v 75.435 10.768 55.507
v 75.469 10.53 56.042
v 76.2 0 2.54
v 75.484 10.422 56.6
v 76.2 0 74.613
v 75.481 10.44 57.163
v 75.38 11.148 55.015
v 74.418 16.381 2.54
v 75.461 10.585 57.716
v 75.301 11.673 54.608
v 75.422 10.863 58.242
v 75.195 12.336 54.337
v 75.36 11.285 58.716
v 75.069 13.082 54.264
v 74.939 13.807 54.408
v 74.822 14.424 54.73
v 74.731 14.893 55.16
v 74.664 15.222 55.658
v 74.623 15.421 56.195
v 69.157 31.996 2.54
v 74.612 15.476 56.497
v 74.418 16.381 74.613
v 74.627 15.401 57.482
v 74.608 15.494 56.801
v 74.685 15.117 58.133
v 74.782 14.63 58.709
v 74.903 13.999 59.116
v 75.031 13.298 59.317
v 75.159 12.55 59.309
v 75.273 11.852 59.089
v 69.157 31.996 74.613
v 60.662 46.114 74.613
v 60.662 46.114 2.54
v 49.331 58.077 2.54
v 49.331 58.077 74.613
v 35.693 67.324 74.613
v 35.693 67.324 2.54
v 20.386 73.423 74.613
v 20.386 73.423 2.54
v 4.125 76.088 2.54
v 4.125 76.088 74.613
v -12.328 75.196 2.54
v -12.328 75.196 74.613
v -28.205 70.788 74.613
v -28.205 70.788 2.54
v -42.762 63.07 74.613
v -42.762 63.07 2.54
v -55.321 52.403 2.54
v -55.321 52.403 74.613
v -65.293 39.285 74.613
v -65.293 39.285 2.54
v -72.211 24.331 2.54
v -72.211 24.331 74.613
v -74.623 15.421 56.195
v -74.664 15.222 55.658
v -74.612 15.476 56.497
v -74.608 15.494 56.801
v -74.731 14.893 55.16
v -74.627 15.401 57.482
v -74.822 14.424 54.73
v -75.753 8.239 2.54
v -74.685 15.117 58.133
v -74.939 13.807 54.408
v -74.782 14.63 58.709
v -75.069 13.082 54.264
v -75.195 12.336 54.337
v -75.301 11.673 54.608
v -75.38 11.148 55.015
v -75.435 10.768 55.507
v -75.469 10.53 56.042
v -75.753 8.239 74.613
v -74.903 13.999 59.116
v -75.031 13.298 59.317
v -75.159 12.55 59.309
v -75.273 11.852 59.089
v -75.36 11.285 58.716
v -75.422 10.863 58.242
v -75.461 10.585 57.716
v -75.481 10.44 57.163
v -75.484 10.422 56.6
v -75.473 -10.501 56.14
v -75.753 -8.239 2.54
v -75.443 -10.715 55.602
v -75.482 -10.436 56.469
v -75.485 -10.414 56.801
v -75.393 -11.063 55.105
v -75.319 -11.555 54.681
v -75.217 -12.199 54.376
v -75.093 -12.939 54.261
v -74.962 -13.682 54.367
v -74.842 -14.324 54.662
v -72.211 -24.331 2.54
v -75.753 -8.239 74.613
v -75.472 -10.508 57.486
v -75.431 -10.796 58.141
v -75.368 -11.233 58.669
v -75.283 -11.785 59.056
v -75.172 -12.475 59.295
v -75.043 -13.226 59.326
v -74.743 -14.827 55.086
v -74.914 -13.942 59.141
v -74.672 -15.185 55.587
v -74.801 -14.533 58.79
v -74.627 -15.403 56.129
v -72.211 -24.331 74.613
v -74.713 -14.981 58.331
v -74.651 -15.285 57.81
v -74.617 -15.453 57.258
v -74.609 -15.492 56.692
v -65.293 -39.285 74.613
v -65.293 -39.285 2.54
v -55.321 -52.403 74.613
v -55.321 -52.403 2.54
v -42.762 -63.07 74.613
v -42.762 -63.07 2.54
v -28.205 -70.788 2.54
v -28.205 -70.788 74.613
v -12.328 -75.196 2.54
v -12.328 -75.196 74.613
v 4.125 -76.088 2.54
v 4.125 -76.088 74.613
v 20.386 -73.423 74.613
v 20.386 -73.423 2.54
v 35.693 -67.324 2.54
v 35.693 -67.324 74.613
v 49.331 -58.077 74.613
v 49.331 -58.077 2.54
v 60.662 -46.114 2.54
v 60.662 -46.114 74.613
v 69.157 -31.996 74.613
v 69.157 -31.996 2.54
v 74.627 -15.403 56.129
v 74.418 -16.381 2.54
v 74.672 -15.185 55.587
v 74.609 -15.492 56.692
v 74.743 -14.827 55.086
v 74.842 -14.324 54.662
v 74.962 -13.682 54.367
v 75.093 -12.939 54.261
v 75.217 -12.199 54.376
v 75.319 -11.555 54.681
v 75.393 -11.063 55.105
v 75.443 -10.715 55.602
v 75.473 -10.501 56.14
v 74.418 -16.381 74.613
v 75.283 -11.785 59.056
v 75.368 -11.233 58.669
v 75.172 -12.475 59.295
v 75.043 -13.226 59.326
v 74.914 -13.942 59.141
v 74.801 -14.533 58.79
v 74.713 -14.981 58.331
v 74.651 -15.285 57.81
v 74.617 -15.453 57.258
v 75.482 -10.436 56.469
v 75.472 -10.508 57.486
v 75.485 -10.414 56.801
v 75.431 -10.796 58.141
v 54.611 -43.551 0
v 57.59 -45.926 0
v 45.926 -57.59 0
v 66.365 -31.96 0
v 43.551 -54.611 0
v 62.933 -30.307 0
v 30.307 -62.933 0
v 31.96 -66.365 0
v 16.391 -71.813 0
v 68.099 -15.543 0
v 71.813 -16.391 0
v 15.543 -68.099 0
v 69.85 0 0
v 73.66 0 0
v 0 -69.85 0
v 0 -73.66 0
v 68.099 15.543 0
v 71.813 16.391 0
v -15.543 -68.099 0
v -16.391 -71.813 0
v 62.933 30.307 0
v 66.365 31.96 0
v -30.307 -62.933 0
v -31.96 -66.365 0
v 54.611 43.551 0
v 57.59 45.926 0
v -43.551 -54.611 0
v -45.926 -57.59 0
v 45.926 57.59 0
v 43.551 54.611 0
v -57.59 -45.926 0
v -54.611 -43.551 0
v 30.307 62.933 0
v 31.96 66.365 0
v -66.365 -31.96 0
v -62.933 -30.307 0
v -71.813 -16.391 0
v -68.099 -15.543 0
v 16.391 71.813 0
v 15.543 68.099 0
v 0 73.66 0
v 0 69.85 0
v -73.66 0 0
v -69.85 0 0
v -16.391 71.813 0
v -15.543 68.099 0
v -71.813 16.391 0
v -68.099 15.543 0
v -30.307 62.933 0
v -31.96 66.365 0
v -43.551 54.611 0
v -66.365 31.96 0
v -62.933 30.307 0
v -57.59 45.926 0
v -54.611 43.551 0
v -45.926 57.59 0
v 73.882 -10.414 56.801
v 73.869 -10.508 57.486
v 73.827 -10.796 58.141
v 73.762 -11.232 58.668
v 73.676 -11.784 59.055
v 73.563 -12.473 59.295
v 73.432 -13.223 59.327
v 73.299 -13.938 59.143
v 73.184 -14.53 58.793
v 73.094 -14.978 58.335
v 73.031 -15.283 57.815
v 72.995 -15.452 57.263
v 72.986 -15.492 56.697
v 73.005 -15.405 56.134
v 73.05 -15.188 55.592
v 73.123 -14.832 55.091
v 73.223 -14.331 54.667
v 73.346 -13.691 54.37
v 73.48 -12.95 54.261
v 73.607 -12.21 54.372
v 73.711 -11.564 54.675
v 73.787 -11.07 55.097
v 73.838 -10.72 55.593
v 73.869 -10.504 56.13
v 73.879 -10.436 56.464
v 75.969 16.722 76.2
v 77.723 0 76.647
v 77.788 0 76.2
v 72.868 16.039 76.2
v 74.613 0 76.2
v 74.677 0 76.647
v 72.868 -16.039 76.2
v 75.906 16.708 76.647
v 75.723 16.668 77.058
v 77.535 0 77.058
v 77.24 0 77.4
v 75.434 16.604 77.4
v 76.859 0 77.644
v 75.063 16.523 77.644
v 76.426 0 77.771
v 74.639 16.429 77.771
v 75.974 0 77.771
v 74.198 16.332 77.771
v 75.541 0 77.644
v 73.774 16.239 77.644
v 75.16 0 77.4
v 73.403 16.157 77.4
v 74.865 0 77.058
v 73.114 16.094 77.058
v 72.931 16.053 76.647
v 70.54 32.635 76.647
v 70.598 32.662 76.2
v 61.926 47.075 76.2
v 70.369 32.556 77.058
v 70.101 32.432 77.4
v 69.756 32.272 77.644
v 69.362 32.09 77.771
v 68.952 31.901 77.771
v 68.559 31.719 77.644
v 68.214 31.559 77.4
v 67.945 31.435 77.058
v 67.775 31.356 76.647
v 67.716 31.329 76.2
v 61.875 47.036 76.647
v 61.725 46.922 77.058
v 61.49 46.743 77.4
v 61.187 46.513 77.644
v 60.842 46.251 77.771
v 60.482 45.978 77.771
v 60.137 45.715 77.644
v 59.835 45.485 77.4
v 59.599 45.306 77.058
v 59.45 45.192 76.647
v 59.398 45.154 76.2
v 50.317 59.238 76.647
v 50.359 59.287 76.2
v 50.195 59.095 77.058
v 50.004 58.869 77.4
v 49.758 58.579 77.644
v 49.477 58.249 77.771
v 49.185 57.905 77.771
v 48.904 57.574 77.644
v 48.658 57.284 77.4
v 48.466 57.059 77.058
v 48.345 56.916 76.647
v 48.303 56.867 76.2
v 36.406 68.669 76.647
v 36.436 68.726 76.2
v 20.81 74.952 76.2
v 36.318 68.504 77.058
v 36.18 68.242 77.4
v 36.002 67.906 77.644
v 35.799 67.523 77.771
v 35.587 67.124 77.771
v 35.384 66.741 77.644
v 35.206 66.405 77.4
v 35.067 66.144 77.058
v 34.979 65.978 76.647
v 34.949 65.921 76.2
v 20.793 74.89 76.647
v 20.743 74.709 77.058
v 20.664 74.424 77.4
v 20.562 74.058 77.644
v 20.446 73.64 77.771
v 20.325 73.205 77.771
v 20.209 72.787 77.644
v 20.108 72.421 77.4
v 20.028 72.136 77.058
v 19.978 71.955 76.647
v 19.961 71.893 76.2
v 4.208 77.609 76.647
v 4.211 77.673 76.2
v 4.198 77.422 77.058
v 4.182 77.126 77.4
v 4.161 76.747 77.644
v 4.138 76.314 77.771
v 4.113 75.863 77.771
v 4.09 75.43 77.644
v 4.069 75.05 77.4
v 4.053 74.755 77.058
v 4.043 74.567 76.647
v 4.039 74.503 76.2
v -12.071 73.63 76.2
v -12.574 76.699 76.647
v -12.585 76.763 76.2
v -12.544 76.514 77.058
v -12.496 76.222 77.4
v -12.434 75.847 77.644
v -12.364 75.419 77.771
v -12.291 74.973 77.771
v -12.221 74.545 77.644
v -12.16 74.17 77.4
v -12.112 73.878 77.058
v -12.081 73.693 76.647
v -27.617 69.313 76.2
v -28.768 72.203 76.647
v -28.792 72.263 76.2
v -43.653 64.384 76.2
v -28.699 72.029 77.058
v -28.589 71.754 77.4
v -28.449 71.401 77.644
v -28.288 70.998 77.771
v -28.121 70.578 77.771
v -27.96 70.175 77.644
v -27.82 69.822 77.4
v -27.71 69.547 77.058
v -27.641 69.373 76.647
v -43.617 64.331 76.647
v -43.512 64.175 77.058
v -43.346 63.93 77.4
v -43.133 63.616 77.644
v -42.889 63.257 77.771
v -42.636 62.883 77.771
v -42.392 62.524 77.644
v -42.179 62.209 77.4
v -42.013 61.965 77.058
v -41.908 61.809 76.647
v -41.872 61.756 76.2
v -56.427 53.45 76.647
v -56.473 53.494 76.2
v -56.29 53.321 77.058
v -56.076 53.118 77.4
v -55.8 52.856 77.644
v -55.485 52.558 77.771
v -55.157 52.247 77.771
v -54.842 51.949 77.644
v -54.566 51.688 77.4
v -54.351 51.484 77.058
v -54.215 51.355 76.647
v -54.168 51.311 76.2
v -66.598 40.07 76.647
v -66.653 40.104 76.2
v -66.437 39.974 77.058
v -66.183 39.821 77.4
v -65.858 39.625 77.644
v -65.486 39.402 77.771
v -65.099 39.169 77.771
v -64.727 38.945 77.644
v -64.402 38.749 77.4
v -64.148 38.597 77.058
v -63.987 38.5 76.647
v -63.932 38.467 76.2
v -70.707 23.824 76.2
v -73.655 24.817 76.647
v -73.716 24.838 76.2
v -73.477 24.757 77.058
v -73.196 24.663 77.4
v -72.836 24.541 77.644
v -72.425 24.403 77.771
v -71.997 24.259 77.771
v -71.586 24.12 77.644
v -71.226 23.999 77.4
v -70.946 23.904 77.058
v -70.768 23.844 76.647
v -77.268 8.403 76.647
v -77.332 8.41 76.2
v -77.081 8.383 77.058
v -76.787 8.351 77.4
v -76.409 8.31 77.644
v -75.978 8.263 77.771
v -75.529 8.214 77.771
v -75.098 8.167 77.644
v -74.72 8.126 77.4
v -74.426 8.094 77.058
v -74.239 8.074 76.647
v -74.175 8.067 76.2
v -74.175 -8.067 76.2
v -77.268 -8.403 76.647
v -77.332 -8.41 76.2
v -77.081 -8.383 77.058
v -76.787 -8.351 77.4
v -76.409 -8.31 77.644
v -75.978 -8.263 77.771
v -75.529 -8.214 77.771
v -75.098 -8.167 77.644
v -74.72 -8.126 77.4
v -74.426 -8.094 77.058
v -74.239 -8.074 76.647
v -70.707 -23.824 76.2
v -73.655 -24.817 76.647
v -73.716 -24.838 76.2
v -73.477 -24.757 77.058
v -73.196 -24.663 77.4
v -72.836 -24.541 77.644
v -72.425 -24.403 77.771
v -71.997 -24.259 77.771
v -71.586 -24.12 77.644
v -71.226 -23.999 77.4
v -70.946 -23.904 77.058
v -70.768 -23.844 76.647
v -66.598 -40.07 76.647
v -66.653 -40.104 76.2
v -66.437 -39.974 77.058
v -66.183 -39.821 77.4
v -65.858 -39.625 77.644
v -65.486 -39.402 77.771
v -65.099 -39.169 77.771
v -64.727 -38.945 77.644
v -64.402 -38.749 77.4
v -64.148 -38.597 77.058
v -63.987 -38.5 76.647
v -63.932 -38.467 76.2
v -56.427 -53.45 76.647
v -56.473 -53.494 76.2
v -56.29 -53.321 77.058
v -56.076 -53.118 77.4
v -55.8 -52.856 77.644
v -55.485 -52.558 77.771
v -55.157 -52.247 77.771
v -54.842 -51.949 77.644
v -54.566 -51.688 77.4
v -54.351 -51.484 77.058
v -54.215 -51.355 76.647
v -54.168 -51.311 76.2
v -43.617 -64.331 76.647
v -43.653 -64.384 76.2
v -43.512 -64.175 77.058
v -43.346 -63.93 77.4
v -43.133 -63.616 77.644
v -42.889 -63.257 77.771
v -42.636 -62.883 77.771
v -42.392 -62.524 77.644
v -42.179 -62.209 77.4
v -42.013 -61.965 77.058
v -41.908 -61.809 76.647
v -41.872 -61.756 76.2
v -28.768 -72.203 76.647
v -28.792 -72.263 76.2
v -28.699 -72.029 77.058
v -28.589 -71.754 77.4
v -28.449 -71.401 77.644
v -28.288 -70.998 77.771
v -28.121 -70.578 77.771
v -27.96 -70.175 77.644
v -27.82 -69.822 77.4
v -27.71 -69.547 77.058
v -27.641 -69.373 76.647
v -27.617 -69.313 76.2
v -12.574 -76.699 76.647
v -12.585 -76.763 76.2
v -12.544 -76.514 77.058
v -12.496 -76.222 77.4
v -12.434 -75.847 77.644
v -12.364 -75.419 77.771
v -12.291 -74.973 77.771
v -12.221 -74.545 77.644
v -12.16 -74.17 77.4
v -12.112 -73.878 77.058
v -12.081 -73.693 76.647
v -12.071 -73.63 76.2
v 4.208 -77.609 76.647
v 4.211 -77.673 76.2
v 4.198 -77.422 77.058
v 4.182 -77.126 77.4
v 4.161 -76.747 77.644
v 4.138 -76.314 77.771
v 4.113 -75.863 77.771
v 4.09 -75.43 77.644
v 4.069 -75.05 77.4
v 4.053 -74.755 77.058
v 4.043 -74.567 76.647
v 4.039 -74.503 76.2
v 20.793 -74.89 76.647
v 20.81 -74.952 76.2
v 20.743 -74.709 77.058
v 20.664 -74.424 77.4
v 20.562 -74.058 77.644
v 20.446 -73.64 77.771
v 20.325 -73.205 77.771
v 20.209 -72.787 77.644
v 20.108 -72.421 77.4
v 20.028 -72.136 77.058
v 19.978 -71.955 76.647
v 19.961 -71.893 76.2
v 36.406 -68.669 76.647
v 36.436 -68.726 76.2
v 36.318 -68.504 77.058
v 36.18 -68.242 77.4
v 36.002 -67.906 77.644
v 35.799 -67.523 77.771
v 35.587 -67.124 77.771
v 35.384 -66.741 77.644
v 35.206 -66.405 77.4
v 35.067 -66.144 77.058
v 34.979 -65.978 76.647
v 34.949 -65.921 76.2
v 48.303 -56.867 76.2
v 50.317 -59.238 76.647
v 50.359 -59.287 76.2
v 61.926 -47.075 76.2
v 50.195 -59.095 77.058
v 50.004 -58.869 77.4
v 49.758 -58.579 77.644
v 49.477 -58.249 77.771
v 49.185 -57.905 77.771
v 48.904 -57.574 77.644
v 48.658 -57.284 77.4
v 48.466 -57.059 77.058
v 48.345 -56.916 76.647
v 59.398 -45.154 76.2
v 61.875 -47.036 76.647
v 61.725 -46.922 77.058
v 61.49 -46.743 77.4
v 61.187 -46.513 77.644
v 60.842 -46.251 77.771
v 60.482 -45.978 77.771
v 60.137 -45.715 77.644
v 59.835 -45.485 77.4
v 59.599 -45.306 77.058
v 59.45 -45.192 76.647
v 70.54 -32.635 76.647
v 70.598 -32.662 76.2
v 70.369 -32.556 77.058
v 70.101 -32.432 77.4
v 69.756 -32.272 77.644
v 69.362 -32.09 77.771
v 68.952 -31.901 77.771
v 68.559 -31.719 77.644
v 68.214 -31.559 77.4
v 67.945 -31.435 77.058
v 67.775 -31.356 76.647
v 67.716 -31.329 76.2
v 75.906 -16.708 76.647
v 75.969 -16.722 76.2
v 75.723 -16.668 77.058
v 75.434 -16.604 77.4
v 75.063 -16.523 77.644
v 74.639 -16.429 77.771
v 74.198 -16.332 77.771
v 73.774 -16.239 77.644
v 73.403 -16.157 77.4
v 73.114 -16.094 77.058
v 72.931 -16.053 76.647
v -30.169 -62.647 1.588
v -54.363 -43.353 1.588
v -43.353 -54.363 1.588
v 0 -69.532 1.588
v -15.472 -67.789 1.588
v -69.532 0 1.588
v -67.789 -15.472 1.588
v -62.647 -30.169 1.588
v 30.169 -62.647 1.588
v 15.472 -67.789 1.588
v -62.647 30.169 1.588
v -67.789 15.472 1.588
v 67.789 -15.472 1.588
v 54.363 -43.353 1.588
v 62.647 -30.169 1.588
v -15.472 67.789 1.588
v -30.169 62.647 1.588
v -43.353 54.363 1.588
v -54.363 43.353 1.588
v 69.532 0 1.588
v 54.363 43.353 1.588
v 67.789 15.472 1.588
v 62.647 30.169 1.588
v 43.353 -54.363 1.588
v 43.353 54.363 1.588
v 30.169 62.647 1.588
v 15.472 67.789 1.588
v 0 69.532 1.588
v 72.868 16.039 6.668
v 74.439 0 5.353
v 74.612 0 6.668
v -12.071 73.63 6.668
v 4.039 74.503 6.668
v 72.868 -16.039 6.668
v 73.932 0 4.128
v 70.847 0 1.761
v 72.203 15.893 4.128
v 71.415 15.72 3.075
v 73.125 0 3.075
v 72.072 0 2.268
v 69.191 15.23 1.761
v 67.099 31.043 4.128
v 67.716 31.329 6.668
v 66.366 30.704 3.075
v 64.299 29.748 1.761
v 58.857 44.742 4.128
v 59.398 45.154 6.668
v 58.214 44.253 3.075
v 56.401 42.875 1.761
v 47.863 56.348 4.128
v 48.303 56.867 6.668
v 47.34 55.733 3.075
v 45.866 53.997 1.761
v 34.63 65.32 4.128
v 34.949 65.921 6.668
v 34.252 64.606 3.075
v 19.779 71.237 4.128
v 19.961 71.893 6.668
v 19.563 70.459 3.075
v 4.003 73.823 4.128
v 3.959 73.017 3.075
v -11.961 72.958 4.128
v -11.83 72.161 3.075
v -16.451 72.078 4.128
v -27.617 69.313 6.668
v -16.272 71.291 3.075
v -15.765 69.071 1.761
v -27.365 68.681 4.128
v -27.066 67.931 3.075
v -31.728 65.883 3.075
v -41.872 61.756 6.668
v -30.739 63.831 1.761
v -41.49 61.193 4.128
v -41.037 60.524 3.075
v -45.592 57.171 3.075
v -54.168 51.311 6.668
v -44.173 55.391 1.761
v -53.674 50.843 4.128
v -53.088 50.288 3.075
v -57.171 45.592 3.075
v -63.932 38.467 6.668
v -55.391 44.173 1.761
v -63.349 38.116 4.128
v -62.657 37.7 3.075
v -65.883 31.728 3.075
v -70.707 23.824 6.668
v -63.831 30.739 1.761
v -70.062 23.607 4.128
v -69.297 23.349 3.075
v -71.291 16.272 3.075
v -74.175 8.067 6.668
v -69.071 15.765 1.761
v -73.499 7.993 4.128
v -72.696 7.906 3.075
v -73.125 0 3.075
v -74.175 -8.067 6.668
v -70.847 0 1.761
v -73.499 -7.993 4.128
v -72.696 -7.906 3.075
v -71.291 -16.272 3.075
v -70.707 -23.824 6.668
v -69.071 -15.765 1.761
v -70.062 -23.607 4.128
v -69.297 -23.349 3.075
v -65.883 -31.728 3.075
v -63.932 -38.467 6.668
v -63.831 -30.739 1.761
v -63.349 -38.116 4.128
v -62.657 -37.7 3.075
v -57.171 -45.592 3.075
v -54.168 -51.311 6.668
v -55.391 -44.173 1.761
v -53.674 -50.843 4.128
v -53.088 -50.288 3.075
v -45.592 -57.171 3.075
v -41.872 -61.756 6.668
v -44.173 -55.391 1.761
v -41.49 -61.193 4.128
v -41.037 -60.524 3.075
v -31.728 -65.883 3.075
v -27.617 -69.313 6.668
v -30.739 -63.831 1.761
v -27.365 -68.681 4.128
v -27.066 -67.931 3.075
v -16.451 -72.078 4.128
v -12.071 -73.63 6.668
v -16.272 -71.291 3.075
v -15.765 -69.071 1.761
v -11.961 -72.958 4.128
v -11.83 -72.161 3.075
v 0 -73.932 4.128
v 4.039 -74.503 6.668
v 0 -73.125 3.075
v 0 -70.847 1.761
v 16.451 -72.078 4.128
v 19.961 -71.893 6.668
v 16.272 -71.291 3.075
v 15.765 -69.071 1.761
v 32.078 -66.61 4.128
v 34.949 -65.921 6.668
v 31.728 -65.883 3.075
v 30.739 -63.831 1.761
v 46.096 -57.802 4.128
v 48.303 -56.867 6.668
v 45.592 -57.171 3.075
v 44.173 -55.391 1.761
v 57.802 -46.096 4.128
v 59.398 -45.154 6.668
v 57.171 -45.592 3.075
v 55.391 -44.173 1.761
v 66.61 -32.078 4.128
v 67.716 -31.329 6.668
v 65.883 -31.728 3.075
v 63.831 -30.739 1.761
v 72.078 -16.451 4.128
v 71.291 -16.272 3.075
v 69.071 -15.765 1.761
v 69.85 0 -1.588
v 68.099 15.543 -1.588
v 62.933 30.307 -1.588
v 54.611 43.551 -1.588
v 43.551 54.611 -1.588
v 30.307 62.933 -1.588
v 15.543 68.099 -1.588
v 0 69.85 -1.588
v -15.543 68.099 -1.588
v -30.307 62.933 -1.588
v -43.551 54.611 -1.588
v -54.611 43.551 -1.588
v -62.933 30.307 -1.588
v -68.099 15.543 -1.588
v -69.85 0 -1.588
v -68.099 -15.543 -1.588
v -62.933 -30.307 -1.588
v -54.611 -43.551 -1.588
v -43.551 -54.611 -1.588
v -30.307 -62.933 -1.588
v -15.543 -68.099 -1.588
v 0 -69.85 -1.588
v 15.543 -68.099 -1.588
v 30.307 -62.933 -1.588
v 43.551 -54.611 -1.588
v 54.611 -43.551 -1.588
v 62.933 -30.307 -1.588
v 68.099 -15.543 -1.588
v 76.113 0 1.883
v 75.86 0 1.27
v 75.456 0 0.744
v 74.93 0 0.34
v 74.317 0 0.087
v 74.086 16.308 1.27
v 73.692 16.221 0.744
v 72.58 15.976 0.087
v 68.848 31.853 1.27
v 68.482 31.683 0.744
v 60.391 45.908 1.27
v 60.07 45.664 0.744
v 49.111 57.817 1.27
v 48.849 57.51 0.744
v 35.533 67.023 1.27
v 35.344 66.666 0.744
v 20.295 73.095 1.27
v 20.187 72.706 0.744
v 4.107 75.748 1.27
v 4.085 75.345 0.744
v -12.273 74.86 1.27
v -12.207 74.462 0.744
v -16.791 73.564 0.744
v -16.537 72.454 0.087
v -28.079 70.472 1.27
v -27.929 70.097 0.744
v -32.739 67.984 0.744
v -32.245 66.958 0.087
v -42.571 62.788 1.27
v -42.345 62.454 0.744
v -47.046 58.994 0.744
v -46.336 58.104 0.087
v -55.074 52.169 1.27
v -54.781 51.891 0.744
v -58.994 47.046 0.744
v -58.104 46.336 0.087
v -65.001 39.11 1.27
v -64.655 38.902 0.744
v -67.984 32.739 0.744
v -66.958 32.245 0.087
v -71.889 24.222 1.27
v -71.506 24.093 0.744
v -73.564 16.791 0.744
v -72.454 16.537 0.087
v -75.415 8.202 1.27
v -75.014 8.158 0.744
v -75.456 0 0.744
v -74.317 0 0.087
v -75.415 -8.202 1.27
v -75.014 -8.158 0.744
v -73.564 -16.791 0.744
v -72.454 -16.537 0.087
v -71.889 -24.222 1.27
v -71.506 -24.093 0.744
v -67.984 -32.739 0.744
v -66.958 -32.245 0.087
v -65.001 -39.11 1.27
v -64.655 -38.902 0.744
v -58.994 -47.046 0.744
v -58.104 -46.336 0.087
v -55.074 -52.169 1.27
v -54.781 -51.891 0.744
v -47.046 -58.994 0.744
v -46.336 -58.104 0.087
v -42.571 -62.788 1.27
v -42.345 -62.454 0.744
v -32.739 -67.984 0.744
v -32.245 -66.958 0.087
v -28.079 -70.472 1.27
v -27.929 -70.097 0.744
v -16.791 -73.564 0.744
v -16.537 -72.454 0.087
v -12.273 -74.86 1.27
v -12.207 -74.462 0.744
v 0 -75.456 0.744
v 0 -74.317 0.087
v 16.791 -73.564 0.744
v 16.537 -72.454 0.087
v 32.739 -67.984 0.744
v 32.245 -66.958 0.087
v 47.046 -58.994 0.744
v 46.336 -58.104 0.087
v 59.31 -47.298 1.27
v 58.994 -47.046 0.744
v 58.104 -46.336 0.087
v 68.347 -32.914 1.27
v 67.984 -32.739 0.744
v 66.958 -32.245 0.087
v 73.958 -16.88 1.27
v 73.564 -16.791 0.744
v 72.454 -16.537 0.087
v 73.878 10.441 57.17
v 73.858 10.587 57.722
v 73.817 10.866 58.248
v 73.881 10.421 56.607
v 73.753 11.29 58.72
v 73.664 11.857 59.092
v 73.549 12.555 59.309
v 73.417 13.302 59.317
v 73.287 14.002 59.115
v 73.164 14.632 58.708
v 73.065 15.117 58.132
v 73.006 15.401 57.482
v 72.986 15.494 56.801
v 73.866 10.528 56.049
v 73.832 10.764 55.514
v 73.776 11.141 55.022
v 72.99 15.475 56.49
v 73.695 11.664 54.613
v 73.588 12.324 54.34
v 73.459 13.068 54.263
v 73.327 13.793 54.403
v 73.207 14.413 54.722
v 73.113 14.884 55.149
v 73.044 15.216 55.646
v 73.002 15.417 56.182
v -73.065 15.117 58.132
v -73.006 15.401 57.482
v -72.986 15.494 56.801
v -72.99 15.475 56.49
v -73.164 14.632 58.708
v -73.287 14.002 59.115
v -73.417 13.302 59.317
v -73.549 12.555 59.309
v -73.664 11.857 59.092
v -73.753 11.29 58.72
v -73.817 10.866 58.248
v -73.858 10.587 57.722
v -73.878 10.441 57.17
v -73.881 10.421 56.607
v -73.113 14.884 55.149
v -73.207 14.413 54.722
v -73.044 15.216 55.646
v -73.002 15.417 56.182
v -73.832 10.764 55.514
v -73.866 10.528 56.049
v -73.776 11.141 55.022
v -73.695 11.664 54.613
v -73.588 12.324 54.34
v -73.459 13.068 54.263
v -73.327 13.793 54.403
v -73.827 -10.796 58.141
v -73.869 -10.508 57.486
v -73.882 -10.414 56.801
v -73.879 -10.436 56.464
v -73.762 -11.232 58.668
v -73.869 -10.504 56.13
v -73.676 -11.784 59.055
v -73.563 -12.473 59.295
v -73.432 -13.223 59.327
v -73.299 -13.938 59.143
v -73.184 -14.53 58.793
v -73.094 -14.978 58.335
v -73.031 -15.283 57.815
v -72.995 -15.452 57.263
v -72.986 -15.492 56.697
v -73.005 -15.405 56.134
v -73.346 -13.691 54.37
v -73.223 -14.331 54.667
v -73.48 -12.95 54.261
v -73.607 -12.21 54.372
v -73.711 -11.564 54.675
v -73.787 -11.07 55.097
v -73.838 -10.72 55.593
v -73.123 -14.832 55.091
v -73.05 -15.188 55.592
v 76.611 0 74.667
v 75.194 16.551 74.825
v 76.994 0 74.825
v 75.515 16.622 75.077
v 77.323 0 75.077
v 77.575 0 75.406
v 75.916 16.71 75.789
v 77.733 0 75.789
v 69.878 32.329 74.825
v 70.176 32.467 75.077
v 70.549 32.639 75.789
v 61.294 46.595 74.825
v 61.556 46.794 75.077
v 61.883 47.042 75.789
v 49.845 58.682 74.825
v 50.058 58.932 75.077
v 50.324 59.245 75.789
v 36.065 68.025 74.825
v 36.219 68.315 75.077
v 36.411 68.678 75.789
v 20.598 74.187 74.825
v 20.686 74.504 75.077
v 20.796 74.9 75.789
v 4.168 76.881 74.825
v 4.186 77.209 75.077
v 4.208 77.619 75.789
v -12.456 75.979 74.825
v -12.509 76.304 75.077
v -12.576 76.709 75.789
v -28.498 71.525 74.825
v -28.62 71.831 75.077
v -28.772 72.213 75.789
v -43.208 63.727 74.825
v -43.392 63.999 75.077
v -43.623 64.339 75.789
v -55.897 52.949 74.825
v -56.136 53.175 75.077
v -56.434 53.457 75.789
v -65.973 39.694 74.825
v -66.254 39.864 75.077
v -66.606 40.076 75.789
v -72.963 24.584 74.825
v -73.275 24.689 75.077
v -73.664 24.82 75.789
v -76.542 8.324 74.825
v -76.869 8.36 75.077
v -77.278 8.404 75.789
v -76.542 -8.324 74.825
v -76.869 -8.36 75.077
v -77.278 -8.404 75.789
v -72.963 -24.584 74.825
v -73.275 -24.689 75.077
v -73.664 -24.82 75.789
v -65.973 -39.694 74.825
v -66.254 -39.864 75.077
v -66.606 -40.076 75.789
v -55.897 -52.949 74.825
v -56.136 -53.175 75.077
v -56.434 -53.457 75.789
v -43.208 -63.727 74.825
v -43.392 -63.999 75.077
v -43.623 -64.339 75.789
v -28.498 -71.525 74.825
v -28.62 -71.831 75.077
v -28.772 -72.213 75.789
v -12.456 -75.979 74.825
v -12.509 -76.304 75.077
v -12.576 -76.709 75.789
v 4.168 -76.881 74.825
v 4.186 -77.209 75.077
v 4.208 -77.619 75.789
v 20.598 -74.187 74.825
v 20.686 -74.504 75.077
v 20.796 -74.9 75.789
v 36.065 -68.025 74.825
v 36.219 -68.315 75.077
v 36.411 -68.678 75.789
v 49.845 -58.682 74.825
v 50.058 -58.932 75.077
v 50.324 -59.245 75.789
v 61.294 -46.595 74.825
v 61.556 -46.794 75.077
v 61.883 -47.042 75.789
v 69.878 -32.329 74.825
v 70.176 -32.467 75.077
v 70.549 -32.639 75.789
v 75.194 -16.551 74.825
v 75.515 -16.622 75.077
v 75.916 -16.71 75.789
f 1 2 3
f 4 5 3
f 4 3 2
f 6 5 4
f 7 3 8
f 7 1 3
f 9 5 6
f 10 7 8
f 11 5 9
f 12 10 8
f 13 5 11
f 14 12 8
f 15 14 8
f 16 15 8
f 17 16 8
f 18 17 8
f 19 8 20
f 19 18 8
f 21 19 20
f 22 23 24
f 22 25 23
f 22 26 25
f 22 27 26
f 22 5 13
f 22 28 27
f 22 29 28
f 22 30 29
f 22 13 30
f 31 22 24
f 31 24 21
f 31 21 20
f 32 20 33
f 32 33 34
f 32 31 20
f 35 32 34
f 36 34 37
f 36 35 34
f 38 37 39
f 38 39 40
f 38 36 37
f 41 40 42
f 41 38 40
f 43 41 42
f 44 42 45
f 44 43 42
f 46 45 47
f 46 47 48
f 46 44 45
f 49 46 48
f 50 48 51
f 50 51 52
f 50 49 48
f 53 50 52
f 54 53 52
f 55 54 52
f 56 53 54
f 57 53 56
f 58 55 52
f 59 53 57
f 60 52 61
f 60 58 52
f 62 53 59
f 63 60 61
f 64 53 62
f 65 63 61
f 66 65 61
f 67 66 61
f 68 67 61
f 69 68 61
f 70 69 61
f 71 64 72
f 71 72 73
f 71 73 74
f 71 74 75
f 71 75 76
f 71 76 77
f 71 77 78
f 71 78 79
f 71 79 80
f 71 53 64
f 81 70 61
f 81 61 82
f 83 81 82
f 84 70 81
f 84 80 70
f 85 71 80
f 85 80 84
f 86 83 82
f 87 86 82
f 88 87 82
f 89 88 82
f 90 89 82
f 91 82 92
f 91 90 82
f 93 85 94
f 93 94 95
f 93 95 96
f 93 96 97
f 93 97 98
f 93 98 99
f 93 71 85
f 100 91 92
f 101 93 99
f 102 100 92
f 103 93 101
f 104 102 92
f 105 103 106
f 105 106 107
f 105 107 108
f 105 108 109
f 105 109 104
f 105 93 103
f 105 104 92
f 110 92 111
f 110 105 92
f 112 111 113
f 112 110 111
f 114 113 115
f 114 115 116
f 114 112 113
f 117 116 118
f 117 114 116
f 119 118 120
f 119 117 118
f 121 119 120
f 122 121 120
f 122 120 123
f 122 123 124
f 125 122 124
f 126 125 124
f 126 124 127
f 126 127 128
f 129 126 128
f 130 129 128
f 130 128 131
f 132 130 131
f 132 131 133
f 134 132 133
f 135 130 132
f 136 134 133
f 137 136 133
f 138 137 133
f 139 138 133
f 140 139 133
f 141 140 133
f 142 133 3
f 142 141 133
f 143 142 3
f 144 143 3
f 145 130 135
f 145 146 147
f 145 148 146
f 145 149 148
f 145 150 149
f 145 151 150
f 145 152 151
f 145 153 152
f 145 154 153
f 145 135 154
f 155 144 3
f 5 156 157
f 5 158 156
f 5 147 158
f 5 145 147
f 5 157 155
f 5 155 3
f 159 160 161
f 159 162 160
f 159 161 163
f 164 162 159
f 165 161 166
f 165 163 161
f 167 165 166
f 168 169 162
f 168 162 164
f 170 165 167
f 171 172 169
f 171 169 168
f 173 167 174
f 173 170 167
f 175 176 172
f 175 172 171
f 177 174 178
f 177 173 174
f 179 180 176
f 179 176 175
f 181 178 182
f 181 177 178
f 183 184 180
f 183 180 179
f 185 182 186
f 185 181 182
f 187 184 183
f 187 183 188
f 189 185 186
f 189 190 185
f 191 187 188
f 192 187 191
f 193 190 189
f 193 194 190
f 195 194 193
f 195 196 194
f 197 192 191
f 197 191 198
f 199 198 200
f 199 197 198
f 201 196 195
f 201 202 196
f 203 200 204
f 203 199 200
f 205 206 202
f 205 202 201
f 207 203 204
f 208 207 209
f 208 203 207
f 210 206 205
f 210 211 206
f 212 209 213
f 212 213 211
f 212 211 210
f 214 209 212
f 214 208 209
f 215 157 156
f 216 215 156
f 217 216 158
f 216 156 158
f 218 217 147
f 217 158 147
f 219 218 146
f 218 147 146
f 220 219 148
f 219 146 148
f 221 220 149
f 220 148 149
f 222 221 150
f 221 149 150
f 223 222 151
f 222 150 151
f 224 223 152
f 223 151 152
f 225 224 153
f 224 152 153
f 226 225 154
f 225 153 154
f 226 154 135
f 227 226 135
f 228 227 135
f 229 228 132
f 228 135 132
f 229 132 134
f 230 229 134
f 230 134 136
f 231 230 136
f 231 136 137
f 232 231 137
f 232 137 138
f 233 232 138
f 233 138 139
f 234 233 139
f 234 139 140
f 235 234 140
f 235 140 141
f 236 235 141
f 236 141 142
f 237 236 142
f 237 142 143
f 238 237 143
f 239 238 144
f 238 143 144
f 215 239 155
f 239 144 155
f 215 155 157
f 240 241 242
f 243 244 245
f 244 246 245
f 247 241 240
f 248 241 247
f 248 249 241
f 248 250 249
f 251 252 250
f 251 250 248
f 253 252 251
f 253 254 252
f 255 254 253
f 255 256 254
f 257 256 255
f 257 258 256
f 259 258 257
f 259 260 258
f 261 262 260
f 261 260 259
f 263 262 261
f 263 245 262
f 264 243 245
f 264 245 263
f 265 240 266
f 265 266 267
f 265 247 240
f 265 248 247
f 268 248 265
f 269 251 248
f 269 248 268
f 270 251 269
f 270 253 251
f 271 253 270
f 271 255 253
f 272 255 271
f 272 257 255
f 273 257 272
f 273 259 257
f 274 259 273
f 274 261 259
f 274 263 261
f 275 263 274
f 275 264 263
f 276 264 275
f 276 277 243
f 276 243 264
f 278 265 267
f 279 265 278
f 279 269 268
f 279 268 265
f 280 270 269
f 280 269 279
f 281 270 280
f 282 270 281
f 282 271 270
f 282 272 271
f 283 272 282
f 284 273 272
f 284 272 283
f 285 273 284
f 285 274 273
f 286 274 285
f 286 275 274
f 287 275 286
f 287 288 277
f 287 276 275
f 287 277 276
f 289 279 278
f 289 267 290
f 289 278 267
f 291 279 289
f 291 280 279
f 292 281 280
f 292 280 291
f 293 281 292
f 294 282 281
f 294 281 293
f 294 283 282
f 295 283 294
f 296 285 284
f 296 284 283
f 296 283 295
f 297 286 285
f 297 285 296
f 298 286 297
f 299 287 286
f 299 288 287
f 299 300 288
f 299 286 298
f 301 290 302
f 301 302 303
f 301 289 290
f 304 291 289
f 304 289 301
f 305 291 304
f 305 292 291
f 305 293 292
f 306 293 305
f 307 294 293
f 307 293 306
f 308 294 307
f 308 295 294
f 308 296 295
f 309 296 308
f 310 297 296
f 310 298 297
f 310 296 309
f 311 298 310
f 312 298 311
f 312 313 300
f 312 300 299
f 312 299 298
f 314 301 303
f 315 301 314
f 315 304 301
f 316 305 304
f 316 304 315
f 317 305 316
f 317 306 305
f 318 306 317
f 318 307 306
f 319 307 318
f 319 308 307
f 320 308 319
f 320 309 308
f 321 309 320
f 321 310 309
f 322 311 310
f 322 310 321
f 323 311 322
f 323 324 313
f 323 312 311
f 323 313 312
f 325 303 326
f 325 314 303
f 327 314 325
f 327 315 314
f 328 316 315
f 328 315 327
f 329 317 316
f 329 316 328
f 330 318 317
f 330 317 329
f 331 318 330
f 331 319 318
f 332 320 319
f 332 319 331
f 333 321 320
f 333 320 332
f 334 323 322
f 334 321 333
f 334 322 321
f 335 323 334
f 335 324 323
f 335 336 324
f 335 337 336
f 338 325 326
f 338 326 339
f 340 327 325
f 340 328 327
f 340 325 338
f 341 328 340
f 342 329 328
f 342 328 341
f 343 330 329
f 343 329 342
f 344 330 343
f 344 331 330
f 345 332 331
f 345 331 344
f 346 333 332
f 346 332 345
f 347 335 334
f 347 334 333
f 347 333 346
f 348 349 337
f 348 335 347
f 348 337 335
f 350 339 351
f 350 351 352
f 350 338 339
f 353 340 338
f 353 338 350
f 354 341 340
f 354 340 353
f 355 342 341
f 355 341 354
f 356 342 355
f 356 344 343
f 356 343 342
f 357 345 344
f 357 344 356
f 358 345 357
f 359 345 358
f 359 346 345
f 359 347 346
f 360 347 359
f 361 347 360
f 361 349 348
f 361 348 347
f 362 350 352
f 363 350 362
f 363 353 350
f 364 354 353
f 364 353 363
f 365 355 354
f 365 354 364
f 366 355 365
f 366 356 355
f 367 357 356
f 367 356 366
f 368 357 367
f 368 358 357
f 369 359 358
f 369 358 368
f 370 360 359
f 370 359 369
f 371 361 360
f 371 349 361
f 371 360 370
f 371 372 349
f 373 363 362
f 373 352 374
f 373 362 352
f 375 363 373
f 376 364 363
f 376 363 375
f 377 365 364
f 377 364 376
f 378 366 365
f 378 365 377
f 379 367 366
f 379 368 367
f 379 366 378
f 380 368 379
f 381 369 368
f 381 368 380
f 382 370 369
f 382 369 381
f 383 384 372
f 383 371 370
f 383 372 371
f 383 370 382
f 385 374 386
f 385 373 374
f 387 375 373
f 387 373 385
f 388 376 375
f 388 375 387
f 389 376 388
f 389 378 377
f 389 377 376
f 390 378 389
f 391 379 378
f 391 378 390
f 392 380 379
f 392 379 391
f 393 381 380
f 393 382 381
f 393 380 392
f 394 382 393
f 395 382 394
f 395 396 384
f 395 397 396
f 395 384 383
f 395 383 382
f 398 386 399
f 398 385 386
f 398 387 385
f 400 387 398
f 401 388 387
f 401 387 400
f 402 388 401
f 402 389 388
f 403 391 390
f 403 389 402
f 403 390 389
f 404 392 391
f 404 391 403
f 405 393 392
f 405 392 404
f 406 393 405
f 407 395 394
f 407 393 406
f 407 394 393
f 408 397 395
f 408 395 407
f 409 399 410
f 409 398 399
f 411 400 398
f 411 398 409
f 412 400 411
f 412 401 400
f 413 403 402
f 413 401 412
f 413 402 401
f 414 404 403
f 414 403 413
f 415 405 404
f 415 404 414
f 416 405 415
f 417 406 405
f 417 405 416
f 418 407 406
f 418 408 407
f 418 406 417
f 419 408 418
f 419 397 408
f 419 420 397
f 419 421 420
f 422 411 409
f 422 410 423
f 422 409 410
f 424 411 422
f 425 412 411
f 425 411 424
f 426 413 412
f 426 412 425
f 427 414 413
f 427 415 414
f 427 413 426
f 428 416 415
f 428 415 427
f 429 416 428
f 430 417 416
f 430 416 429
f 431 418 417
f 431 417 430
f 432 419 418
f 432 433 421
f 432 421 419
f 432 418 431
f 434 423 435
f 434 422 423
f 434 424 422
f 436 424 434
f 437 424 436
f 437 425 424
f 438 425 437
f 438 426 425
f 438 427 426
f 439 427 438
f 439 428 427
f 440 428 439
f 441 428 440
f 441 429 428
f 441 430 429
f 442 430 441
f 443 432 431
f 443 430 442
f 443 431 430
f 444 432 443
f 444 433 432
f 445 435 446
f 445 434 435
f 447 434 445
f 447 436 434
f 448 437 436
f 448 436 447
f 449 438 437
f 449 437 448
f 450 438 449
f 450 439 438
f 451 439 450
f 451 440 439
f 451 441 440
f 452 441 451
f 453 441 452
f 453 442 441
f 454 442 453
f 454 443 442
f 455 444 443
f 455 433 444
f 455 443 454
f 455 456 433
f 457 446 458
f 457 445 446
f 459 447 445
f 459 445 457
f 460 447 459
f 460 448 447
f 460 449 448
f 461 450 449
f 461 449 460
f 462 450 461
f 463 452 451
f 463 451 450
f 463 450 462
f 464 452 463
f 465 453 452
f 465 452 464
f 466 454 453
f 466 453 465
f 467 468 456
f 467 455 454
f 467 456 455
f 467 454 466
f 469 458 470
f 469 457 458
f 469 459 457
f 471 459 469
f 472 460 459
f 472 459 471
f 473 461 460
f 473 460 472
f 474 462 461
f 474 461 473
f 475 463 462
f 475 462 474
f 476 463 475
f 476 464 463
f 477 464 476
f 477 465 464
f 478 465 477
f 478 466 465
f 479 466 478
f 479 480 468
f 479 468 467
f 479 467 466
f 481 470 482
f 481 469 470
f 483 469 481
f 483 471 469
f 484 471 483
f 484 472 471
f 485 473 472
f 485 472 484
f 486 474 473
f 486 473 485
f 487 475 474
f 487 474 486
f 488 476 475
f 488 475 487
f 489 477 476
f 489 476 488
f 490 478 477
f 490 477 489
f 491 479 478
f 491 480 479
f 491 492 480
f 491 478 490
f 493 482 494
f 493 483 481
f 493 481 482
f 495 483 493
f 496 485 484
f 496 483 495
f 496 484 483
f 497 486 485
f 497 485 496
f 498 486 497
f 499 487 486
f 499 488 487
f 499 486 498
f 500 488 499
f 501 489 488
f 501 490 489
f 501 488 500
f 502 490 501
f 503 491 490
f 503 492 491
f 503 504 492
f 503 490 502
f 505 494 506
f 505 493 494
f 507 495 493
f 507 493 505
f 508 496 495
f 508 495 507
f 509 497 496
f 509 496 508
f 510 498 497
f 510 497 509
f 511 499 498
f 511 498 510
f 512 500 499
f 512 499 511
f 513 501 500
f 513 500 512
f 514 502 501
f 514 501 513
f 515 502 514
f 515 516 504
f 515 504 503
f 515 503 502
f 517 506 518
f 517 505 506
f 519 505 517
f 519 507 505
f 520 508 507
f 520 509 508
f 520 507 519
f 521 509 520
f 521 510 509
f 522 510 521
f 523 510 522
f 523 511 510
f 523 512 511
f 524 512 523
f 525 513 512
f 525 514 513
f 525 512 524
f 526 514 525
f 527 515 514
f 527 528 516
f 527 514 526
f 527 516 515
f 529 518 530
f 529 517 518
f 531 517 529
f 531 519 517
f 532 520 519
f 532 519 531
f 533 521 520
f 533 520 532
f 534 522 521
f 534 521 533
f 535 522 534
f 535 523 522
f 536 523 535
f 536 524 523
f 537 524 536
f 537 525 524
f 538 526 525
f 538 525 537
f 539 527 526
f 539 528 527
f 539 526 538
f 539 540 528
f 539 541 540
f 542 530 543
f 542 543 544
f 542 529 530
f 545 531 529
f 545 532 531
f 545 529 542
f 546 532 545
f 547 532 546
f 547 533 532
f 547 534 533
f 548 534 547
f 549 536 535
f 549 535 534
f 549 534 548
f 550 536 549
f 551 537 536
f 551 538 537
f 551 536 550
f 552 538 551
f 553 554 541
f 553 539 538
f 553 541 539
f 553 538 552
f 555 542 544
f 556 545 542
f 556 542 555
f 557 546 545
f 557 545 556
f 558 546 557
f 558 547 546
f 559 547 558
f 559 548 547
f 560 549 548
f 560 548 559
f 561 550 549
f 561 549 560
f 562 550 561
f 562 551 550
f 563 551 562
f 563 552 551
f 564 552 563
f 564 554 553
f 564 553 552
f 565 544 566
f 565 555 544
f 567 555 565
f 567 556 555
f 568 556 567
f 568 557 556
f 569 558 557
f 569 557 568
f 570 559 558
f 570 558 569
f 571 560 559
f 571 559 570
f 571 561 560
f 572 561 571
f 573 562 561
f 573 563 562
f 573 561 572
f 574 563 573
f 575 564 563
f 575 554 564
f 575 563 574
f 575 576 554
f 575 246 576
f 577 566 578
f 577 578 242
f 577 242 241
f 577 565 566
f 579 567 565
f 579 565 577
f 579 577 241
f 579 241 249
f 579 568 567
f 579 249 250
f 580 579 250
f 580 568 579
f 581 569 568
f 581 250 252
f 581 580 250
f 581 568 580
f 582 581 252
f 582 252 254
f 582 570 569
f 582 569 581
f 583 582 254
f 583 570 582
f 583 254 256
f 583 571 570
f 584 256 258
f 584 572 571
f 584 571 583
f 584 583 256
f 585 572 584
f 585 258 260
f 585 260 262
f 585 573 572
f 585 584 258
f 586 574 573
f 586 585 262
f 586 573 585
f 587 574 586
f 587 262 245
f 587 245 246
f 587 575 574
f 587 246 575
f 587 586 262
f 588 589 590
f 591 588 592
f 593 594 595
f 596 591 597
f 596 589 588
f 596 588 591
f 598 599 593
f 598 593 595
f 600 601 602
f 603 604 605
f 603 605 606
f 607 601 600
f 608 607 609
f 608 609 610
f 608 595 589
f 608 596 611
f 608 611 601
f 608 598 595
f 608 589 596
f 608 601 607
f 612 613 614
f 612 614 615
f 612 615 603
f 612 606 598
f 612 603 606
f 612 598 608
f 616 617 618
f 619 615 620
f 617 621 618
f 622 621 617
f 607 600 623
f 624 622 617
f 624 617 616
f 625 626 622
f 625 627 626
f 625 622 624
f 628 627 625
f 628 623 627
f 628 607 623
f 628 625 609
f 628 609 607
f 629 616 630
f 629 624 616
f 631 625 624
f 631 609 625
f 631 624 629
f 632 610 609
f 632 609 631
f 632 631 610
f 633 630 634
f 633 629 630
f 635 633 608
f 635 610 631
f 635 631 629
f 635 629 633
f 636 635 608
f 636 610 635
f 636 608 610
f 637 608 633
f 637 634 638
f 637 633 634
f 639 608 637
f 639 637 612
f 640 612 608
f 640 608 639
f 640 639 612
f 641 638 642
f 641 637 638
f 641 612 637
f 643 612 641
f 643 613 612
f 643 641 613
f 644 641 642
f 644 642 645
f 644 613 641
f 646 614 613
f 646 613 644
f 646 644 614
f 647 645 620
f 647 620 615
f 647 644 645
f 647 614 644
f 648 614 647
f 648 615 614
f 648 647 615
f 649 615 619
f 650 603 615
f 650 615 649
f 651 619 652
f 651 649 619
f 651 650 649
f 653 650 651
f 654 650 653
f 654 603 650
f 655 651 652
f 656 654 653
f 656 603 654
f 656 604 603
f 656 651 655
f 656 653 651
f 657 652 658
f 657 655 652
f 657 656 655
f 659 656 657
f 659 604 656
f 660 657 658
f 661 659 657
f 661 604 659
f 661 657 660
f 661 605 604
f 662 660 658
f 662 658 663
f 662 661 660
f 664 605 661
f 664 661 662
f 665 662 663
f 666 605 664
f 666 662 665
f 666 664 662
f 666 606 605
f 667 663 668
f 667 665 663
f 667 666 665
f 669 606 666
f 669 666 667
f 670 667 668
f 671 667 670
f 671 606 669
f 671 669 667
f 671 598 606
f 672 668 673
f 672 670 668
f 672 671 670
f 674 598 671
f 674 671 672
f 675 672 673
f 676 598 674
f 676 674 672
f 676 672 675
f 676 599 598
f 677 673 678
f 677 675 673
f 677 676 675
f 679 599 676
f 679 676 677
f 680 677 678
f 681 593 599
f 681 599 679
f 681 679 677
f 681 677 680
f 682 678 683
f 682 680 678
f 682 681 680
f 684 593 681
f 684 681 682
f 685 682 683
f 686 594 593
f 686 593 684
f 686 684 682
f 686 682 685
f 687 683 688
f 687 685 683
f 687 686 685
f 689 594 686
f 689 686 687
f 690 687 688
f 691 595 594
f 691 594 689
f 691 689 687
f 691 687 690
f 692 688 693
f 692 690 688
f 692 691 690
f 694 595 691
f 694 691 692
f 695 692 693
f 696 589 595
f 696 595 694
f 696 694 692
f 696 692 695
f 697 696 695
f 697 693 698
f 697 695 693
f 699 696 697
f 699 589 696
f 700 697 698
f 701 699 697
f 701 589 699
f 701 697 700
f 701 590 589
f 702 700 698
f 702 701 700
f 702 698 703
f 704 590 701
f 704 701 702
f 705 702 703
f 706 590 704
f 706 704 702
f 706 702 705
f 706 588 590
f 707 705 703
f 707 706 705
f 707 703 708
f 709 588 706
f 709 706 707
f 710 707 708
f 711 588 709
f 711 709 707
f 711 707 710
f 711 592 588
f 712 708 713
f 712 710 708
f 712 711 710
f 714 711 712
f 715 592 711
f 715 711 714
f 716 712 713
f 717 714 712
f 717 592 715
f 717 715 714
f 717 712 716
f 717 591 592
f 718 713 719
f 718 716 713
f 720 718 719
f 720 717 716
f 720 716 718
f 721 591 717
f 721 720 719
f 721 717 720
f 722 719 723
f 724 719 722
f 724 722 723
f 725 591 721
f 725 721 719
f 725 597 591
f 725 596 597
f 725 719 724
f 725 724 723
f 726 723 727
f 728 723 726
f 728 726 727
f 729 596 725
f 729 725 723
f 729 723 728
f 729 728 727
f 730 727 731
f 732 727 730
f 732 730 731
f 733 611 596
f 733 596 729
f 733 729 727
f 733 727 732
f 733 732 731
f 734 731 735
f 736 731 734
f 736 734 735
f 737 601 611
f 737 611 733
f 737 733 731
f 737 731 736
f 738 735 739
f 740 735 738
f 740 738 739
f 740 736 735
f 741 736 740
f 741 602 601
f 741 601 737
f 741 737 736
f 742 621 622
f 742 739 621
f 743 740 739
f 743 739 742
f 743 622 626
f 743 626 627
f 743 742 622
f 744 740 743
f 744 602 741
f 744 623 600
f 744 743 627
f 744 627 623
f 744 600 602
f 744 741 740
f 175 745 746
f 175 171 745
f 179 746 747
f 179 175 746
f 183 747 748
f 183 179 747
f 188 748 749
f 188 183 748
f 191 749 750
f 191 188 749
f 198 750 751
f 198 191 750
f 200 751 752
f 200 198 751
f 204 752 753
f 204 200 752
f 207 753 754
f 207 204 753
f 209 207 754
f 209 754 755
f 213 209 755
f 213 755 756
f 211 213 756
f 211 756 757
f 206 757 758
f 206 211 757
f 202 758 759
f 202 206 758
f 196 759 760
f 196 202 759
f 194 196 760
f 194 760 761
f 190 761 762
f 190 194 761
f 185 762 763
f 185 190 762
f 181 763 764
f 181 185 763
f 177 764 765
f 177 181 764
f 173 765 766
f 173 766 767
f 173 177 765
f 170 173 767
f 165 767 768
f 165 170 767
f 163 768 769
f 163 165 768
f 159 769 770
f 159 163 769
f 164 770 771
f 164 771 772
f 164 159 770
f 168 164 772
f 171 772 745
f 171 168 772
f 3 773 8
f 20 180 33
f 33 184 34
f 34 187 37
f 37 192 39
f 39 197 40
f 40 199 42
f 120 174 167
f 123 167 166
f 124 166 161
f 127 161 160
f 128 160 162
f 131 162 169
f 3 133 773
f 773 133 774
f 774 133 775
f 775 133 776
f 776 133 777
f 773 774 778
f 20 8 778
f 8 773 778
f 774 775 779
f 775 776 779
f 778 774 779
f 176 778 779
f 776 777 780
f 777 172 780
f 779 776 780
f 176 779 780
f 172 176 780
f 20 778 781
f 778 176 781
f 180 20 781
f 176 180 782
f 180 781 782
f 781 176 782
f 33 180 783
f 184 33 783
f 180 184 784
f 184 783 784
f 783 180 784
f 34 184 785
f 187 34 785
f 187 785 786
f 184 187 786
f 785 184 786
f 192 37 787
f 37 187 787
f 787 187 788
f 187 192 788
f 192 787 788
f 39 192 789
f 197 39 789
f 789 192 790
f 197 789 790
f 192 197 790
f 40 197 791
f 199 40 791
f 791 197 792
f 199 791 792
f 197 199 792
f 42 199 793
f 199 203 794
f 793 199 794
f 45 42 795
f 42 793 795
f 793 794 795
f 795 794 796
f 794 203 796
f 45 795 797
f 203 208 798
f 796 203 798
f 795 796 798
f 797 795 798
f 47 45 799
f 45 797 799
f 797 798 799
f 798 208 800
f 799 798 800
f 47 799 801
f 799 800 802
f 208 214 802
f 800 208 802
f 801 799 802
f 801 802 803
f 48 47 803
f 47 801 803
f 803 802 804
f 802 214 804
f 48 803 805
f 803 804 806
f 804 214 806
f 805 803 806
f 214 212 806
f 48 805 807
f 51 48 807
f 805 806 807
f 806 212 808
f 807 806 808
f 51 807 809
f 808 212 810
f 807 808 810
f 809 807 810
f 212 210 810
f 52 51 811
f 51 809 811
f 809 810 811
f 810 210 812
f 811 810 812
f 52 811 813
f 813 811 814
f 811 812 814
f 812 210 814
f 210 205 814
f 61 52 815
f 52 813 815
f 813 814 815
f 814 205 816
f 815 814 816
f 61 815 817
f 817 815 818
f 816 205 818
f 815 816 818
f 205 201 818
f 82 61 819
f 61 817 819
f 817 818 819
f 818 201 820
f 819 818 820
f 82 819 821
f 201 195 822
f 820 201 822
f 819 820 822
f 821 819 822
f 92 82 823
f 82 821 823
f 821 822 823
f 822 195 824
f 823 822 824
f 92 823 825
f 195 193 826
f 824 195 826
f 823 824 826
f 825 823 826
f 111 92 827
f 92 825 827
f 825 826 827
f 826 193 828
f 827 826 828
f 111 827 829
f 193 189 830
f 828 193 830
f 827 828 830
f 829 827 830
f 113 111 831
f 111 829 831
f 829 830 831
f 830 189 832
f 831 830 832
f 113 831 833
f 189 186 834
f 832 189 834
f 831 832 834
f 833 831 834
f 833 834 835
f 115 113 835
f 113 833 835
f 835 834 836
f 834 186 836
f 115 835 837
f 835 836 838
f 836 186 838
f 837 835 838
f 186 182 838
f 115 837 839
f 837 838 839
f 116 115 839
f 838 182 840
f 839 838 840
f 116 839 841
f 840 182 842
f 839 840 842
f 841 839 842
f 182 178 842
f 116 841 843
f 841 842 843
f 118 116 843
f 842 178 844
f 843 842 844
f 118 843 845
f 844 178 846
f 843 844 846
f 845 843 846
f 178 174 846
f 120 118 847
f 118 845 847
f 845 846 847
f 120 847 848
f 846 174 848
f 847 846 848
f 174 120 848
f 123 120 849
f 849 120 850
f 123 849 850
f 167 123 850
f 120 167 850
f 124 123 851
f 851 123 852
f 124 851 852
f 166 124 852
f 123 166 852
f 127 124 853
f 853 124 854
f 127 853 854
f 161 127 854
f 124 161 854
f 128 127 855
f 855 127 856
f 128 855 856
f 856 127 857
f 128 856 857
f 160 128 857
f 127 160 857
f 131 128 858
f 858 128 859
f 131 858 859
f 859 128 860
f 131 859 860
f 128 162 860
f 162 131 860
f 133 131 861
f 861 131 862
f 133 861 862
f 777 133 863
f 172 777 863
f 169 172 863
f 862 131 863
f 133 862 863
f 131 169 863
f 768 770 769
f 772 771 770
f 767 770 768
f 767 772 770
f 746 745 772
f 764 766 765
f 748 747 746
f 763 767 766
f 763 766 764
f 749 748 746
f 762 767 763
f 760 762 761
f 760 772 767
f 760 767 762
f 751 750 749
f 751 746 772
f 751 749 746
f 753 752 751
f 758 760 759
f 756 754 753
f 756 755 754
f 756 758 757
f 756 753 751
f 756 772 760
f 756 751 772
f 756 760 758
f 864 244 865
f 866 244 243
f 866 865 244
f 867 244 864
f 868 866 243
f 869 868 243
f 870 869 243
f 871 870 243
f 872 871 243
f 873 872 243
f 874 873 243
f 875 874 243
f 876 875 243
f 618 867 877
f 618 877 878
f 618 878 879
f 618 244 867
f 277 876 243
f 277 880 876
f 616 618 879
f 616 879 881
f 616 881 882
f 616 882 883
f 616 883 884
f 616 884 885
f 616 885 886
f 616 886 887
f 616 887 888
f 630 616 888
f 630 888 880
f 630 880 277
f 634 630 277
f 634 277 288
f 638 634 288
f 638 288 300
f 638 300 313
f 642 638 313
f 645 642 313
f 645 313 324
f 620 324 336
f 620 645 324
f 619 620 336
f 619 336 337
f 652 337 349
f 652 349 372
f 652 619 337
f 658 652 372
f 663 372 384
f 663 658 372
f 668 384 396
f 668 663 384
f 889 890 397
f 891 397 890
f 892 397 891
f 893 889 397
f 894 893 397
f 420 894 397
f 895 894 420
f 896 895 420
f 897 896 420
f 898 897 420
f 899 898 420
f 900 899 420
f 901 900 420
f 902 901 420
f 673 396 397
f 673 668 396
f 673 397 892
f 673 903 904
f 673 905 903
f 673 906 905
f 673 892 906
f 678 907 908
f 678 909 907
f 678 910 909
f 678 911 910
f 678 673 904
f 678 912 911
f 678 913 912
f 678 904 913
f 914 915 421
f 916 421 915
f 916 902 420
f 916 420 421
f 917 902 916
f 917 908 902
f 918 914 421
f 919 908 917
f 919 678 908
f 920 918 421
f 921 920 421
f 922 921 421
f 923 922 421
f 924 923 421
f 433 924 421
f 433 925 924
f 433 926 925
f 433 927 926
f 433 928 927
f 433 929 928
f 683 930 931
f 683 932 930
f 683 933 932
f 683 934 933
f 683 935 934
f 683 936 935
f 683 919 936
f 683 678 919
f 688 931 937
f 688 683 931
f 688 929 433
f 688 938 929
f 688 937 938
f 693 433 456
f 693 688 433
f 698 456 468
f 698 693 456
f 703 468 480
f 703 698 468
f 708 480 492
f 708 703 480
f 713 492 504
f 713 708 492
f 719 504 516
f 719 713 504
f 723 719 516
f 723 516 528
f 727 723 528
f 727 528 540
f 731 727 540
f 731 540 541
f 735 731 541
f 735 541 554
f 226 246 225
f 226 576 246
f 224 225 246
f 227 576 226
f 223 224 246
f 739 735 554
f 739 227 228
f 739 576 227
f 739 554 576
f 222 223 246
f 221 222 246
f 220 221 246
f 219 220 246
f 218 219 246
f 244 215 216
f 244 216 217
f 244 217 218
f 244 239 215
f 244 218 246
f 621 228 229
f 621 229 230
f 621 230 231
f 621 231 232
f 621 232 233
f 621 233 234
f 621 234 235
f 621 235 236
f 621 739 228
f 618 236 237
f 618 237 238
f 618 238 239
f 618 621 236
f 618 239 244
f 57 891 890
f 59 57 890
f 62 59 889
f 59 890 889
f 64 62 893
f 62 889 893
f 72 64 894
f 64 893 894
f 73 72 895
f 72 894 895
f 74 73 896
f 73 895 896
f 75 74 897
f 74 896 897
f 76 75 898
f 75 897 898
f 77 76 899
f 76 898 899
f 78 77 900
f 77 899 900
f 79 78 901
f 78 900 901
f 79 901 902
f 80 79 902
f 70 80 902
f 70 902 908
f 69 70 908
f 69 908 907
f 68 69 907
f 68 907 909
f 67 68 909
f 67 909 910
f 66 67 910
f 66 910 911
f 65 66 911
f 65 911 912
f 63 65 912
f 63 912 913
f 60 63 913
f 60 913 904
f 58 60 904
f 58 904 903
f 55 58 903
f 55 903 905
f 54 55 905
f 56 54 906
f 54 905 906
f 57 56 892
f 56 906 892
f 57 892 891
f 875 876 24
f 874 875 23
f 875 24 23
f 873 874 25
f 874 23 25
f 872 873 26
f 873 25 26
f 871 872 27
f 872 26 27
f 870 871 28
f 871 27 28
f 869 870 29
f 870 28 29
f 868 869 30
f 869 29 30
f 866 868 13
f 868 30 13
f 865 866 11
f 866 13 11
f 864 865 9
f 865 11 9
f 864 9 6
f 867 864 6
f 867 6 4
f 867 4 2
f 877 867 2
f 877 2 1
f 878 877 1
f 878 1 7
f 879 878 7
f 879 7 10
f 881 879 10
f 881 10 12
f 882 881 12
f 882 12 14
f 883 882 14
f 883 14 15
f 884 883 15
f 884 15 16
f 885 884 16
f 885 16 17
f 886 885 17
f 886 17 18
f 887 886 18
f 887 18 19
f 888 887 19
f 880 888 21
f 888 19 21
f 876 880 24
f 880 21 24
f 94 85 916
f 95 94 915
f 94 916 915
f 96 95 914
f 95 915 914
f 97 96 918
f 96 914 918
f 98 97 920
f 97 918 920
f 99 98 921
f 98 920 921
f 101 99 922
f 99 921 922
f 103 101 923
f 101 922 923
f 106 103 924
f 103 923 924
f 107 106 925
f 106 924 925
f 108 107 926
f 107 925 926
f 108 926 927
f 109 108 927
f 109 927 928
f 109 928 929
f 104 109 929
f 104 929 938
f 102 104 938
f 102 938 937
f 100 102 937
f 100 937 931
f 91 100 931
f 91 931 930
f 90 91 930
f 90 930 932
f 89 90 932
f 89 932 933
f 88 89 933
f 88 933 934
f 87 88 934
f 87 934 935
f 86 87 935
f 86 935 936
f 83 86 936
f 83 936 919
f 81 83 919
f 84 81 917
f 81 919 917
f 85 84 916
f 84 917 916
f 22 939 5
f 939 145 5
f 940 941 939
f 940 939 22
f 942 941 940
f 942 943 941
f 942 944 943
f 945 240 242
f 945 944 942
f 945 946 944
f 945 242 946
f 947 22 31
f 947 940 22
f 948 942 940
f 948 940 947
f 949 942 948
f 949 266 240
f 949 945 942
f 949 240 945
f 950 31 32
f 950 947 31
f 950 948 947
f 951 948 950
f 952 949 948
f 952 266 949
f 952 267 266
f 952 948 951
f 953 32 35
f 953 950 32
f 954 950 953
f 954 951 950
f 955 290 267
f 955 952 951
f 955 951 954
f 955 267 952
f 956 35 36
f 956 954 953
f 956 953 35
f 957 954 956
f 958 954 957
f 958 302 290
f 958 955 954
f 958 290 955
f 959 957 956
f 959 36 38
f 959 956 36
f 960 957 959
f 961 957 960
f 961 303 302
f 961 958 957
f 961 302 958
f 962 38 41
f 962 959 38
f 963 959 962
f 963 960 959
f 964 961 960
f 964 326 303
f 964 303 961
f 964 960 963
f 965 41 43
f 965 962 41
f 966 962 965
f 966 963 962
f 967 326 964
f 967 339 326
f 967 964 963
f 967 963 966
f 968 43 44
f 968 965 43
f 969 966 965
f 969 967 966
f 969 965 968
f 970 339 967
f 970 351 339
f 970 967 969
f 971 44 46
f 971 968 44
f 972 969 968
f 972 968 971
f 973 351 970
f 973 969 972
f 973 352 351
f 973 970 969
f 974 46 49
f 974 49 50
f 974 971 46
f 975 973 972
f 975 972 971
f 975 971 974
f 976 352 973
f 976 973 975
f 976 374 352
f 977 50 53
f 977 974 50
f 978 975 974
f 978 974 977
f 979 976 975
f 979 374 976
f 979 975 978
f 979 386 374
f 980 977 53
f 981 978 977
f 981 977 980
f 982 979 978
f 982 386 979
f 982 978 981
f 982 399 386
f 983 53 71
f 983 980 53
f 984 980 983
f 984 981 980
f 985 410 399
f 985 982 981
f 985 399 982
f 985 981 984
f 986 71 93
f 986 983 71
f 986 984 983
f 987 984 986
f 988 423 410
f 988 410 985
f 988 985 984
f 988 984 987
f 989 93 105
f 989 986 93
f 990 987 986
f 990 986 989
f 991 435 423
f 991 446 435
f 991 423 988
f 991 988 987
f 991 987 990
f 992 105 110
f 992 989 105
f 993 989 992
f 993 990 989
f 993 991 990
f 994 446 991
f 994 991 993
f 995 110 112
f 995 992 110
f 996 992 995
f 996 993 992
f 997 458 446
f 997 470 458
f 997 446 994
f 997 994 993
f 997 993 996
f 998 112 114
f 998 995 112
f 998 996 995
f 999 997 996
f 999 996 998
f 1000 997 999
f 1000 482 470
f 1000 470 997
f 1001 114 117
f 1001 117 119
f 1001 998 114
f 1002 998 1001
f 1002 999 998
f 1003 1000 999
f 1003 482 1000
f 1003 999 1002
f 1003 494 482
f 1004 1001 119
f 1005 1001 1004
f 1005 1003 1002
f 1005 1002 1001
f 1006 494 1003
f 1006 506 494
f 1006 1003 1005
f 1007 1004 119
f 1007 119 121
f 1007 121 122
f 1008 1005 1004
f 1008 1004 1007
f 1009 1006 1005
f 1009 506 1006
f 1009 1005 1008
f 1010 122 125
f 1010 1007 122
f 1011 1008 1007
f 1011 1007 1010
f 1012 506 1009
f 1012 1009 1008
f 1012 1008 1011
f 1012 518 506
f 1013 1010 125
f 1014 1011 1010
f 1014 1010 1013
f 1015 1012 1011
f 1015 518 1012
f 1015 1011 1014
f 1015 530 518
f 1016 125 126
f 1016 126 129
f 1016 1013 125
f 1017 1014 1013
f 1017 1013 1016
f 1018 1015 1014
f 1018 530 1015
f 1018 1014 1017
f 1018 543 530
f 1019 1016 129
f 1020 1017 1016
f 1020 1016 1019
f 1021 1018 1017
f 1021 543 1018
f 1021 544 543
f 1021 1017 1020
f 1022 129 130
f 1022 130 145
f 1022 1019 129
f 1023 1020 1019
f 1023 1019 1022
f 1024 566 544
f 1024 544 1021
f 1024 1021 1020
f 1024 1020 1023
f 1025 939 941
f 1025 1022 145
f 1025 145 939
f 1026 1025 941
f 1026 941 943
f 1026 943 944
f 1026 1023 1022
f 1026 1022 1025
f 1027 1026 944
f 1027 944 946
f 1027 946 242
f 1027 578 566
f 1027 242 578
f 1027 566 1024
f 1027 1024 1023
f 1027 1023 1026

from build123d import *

# Parameters (mm, degrees)
F0_W     = 69.85
F0_H     = 1.5875
F2_R     = 5.08
F3_R     = 2.54
F5_R     = 2.54
F6_DEPTH = 228.854
F7_DEPTH = 243.84


with BuildPart() as f1:
    # F0 (on Front) → F1 (revolve)
    with BuildSketch(Plane.XZ):
        with BuildLine():
            Line((0, 1.5875), (0, 0))
            Line((0, 0), (69.85, 0))
            Line((69.85, 0), (76.2, 0))
            Line((76.2, 0), (76.2, 74.6125))
            ThreePointArc((76.2, 74.6125), (75.077468, 75.077468), (74.6125, 76.2))
            Line((74.6125, 76.2), (74.6125, 1.5875))
            Line((74.6125, 1.5875), (0, 1.5875))
        make_face()
        with Locations((34.925, -0.79375)):
            Rectangle(F0_W, F0_H)
        with BuildLine():
            ThreePointArc((74.6125, 76.2), (75.077468, 75.077468), (76.2, 74.6125))
            ThreePointArc((76.2, 74.6125), (77.322532, 75.077468), (77.7875, 76.2))
            ThreePointArc((77.7875, 76.2), (76.2, 77.7875), (74.6125, 76.2))
        make_face()
    revolve(axis=Axis((0, 0, 12.051039), (0, 0, 1)))

    # F2
    f2_edges = [f1.edges().sort_by_distance(p)[0] for p in [
        (-74.6125, 0, 1.5875),
    ]]
    fillet(f2_edges, radius=F2_R)

    # F3
    f3_edges = [f1.edges().sort_by_distance(p)[0] for p in [
        (-76.2, 0, 0),
    ]]
    fillet(f3_edges, radius=F3_R)

    # F5 (on offset) → F6 (cut)
    with BuildSketch(Plane.YZ.offset(101.6)):
        with Locations((-12.954, 56.800925)):
            Circle(F5_R)
    extrude(amount=-F6_DEPTH, mode=Mode.SUBTRACT)

    # F5 (on offset) → F7 (cut)
    with BuildSketch(Plane.YZ.offset(101.6)):
        with Locations((12.954, 56.800925)):
            Circle(F5_R)
    extrude(amount=-F7_DEPTH, mode=Mode.SUBTRACT)


solid = f1.part
